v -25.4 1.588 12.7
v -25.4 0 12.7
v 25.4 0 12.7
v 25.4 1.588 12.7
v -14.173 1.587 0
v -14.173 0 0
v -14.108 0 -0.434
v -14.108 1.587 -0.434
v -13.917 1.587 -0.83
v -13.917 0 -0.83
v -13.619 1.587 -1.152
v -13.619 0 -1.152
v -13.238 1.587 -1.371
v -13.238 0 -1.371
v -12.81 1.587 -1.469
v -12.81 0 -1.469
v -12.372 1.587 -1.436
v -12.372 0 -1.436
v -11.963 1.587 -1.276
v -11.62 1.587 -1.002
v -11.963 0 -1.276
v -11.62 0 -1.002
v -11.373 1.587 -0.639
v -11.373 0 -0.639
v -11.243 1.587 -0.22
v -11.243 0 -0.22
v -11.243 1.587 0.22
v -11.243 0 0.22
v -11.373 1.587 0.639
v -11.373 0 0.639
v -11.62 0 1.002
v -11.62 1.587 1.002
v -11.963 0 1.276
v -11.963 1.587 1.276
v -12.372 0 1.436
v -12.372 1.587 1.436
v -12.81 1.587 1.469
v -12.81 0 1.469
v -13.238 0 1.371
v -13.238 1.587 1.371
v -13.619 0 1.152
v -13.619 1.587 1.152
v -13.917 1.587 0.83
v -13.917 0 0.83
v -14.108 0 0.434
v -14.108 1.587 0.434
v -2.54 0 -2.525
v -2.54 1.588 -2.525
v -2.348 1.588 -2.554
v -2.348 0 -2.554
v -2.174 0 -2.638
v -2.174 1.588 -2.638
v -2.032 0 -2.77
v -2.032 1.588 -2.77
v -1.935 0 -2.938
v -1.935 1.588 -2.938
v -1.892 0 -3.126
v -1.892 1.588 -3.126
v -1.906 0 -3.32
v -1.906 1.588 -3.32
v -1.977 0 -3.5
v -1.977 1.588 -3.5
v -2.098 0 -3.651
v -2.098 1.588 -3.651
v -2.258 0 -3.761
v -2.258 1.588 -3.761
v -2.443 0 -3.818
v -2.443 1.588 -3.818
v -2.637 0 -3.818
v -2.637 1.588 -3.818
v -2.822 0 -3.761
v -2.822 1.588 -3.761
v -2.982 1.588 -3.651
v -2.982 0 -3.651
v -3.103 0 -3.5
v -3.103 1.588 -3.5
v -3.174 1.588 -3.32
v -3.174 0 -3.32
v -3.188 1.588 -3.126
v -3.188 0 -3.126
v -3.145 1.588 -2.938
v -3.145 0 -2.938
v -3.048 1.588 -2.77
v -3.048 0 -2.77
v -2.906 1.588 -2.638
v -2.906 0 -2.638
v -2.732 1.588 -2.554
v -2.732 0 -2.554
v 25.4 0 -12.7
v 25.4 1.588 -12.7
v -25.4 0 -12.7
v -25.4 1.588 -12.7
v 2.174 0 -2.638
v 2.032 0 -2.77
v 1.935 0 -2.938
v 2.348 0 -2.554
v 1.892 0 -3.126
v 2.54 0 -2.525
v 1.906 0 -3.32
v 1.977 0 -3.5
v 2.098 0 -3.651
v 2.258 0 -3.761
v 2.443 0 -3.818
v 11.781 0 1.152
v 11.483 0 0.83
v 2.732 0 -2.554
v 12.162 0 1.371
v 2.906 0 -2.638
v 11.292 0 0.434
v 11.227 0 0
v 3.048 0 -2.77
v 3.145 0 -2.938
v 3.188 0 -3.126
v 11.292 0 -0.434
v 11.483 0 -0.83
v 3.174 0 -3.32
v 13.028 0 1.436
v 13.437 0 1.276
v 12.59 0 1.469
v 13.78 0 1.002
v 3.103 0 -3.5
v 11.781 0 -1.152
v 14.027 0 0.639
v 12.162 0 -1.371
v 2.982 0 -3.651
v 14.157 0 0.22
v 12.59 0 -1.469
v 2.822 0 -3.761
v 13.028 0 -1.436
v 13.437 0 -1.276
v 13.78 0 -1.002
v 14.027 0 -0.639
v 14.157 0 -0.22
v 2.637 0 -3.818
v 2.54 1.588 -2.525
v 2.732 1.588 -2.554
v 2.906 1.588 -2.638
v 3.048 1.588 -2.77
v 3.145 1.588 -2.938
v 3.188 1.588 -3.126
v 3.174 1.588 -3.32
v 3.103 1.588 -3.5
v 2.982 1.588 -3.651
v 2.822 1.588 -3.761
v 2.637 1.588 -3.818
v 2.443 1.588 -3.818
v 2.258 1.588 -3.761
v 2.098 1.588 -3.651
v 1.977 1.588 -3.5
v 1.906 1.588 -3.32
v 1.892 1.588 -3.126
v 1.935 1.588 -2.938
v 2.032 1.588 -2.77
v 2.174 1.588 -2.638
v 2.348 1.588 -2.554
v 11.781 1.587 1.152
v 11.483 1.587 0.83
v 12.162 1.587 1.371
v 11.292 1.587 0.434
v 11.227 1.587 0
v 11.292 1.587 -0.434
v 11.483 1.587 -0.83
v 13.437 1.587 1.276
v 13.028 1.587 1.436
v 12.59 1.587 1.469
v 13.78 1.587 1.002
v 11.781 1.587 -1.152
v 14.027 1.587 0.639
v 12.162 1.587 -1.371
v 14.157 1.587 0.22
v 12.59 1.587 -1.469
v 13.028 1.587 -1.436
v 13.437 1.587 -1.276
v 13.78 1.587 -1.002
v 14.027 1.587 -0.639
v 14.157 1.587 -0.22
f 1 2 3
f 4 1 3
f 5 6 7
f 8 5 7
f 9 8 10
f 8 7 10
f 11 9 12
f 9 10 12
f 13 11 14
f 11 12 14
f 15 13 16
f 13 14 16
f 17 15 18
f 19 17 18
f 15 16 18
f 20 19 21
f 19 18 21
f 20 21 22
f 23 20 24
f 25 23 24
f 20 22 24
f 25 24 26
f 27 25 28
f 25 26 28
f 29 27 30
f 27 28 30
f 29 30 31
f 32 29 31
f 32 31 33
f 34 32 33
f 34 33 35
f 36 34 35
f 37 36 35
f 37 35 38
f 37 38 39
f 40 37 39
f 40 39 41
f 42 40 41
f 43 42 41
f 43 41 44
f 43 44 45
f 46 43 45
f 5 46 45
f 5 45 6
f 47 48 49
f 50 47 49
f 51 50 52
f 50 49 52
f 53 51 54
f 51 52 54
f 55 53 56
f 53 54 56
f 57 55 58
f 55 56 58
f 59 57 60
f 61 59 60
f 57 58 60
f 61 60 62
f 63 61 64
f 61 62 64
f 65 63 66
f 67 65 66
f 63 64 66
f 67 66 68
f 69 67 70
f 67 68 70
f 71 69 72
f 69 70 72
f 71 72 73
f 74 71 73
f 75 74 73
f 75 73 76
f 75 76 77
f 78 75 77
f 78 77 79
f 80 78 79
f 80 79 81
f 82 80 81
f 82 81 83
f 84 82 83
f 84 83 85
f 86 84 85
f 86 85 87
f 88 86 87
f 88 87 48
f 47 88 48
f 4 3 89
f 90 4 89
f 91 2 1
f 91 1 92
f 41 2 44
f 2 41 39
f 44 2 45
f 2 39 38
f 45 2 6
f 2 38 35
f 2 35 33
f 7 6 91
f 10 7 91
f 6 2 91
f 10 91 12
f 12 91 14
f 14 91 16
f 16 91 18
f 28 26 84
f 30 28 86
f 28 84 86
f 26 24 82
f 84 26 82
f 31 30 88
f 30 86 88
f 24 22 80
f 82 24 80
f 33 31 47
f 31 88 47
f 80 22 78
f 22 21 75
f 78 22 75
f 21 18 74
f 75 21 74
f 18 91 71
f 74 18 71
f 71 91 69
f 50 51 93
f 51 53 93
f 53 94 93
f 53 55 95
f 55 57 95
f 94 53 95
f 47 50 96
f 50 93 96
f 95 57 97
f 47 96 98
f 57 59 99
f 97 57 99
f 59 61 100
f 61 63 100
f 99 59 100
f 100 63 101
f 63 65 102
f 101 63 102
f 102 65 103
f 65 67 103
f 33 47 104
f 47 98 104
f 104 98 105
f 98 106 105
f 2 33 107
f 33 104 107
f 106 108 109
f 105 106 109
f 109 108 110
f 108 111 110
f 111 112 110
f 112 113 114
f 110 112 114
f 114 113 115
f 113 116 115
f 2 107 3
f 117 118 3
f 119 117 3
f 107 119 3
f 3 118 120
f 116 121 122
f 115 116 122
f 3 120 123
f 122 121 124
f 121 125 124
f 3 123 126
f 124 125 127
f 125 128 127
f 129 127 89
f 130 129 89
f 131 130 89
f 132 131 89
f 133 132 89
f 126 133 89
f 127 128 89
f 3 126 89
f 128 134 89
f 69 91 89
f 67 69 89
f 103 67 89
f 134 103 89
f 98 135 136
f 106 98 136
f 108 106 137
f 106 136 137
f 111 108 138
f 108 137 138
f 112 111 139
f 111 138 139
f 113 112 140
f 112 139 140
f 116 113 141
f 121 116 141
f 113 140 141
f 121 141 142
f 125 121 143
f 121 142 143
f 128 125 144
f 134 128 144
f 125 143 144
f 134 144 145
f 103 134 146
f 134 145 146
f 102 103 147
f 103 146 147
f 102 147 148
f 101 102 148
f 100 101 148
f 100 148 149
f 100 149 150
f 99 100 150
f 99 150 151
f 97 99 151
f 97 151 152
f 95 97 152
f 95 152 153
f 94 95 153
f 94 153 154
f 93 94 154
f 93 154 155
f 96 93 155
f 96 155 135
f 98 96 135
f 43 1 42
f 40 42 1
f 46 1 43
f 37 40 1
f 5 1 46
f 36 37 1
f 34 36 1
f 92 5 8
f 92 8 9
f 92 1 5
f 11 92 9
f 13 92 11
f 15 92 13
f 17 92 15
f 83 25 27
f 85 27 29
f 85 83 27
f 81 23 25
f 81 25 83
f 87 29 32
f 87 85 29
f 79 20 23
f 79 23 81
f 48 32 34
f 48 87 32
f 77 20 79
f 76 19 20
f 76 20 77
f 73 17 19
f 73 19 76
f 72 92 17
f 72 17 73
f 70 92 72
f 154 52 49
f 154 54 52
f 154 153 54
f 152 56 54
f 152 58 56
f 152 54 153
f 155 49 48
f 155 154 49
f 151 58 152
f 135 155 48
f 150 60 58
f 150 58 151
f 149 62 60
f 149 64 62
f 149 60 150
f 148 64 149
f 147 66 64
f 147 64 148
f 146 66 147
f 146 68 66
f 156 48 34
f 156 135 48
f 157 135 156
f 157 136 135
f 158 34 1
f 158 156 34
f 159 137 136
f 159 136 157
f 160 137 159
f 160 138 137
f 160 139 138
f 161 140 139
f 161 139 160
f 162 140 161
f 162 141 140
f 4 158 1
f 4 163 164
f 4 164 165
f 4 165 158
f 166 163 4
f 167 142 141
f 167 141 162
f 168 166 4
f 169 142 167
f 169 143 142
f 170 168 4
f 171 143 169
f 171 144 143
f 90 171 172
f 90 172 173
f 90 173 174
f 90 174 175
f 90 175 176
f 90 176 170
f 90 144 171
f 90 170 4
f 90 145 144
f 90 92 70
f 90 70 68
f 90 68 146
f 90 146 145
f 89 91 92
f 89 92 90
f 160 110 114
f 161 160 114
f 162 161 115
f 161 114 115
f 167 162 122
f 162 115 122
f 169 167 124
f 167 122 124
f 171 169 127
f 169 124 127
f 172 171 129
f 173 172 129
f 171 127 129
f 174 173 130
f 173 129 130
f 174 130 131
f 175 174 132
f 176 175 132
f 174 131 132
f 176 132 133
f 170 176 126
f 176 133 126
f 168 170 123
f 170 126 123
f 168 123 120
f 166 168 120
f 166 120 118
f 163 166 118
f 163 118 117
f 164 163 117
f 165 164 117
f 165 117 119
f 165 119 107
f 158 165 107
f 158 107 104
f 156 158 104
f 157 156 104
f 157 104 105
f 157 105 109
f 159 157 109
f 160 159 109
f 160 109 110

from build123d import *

# Parameters (mm, degrees)
SKETCH1_W             = 50.8
SKETCH1_H             = 25.4
BOSS_EXTRUDE1_DEPTH   = 1.5875
SKETCH2_R             = 0.65
CUT_EXTRUDE1_DEPTH    = 29.442400677
F_4_CLEARANCE_HOLE2_D = 2.9464


with BuildPart() as part:
    # Sketch1 → Boss-Extrude1 (new body)
    with BuildSketch(Plane(origin=(0, 0, 0), x_dir=(1, 0, 0), z_dir=(0, 1, 0))):
        Rectangle(SKETCH1_W, SKETCH1_H)
    extrude(amount=BOSS_EXTRUDE1_DEPTH)

    # Sketch2 → Cut-Extrude1 (cut, through all)
    with BuildSketch(Plane(origin=(0, 1.5875, 0), x_dir=(1, 0, 0), z_dir=(0, 1, 0))):
        with Locations(Location((-2.54, 3.175, 0), (0, 0, 270))):
            Circle(SKETCH2_R)
        with Locations(Location((2.54, 3.175, 0), (0, 0, 270))):
            Circle(SKETCH2_R)
    extrude(amount=-CUT_EXTRUDE1_DEPTH, mode=Mode.SUBTRACT)

    # #4 Clearance Hole2 (through all)
    with Locations(Plane(origin=(0, 1.5875, 0), x_dir=(1, 0, 0), z_dir=(0, 1, 0))):
        with Locations((-12.7, 0), (12.7, 0)):
            Hole(F_4_CLEARANCE_HOLE2_D / 2)


solid = part.part
